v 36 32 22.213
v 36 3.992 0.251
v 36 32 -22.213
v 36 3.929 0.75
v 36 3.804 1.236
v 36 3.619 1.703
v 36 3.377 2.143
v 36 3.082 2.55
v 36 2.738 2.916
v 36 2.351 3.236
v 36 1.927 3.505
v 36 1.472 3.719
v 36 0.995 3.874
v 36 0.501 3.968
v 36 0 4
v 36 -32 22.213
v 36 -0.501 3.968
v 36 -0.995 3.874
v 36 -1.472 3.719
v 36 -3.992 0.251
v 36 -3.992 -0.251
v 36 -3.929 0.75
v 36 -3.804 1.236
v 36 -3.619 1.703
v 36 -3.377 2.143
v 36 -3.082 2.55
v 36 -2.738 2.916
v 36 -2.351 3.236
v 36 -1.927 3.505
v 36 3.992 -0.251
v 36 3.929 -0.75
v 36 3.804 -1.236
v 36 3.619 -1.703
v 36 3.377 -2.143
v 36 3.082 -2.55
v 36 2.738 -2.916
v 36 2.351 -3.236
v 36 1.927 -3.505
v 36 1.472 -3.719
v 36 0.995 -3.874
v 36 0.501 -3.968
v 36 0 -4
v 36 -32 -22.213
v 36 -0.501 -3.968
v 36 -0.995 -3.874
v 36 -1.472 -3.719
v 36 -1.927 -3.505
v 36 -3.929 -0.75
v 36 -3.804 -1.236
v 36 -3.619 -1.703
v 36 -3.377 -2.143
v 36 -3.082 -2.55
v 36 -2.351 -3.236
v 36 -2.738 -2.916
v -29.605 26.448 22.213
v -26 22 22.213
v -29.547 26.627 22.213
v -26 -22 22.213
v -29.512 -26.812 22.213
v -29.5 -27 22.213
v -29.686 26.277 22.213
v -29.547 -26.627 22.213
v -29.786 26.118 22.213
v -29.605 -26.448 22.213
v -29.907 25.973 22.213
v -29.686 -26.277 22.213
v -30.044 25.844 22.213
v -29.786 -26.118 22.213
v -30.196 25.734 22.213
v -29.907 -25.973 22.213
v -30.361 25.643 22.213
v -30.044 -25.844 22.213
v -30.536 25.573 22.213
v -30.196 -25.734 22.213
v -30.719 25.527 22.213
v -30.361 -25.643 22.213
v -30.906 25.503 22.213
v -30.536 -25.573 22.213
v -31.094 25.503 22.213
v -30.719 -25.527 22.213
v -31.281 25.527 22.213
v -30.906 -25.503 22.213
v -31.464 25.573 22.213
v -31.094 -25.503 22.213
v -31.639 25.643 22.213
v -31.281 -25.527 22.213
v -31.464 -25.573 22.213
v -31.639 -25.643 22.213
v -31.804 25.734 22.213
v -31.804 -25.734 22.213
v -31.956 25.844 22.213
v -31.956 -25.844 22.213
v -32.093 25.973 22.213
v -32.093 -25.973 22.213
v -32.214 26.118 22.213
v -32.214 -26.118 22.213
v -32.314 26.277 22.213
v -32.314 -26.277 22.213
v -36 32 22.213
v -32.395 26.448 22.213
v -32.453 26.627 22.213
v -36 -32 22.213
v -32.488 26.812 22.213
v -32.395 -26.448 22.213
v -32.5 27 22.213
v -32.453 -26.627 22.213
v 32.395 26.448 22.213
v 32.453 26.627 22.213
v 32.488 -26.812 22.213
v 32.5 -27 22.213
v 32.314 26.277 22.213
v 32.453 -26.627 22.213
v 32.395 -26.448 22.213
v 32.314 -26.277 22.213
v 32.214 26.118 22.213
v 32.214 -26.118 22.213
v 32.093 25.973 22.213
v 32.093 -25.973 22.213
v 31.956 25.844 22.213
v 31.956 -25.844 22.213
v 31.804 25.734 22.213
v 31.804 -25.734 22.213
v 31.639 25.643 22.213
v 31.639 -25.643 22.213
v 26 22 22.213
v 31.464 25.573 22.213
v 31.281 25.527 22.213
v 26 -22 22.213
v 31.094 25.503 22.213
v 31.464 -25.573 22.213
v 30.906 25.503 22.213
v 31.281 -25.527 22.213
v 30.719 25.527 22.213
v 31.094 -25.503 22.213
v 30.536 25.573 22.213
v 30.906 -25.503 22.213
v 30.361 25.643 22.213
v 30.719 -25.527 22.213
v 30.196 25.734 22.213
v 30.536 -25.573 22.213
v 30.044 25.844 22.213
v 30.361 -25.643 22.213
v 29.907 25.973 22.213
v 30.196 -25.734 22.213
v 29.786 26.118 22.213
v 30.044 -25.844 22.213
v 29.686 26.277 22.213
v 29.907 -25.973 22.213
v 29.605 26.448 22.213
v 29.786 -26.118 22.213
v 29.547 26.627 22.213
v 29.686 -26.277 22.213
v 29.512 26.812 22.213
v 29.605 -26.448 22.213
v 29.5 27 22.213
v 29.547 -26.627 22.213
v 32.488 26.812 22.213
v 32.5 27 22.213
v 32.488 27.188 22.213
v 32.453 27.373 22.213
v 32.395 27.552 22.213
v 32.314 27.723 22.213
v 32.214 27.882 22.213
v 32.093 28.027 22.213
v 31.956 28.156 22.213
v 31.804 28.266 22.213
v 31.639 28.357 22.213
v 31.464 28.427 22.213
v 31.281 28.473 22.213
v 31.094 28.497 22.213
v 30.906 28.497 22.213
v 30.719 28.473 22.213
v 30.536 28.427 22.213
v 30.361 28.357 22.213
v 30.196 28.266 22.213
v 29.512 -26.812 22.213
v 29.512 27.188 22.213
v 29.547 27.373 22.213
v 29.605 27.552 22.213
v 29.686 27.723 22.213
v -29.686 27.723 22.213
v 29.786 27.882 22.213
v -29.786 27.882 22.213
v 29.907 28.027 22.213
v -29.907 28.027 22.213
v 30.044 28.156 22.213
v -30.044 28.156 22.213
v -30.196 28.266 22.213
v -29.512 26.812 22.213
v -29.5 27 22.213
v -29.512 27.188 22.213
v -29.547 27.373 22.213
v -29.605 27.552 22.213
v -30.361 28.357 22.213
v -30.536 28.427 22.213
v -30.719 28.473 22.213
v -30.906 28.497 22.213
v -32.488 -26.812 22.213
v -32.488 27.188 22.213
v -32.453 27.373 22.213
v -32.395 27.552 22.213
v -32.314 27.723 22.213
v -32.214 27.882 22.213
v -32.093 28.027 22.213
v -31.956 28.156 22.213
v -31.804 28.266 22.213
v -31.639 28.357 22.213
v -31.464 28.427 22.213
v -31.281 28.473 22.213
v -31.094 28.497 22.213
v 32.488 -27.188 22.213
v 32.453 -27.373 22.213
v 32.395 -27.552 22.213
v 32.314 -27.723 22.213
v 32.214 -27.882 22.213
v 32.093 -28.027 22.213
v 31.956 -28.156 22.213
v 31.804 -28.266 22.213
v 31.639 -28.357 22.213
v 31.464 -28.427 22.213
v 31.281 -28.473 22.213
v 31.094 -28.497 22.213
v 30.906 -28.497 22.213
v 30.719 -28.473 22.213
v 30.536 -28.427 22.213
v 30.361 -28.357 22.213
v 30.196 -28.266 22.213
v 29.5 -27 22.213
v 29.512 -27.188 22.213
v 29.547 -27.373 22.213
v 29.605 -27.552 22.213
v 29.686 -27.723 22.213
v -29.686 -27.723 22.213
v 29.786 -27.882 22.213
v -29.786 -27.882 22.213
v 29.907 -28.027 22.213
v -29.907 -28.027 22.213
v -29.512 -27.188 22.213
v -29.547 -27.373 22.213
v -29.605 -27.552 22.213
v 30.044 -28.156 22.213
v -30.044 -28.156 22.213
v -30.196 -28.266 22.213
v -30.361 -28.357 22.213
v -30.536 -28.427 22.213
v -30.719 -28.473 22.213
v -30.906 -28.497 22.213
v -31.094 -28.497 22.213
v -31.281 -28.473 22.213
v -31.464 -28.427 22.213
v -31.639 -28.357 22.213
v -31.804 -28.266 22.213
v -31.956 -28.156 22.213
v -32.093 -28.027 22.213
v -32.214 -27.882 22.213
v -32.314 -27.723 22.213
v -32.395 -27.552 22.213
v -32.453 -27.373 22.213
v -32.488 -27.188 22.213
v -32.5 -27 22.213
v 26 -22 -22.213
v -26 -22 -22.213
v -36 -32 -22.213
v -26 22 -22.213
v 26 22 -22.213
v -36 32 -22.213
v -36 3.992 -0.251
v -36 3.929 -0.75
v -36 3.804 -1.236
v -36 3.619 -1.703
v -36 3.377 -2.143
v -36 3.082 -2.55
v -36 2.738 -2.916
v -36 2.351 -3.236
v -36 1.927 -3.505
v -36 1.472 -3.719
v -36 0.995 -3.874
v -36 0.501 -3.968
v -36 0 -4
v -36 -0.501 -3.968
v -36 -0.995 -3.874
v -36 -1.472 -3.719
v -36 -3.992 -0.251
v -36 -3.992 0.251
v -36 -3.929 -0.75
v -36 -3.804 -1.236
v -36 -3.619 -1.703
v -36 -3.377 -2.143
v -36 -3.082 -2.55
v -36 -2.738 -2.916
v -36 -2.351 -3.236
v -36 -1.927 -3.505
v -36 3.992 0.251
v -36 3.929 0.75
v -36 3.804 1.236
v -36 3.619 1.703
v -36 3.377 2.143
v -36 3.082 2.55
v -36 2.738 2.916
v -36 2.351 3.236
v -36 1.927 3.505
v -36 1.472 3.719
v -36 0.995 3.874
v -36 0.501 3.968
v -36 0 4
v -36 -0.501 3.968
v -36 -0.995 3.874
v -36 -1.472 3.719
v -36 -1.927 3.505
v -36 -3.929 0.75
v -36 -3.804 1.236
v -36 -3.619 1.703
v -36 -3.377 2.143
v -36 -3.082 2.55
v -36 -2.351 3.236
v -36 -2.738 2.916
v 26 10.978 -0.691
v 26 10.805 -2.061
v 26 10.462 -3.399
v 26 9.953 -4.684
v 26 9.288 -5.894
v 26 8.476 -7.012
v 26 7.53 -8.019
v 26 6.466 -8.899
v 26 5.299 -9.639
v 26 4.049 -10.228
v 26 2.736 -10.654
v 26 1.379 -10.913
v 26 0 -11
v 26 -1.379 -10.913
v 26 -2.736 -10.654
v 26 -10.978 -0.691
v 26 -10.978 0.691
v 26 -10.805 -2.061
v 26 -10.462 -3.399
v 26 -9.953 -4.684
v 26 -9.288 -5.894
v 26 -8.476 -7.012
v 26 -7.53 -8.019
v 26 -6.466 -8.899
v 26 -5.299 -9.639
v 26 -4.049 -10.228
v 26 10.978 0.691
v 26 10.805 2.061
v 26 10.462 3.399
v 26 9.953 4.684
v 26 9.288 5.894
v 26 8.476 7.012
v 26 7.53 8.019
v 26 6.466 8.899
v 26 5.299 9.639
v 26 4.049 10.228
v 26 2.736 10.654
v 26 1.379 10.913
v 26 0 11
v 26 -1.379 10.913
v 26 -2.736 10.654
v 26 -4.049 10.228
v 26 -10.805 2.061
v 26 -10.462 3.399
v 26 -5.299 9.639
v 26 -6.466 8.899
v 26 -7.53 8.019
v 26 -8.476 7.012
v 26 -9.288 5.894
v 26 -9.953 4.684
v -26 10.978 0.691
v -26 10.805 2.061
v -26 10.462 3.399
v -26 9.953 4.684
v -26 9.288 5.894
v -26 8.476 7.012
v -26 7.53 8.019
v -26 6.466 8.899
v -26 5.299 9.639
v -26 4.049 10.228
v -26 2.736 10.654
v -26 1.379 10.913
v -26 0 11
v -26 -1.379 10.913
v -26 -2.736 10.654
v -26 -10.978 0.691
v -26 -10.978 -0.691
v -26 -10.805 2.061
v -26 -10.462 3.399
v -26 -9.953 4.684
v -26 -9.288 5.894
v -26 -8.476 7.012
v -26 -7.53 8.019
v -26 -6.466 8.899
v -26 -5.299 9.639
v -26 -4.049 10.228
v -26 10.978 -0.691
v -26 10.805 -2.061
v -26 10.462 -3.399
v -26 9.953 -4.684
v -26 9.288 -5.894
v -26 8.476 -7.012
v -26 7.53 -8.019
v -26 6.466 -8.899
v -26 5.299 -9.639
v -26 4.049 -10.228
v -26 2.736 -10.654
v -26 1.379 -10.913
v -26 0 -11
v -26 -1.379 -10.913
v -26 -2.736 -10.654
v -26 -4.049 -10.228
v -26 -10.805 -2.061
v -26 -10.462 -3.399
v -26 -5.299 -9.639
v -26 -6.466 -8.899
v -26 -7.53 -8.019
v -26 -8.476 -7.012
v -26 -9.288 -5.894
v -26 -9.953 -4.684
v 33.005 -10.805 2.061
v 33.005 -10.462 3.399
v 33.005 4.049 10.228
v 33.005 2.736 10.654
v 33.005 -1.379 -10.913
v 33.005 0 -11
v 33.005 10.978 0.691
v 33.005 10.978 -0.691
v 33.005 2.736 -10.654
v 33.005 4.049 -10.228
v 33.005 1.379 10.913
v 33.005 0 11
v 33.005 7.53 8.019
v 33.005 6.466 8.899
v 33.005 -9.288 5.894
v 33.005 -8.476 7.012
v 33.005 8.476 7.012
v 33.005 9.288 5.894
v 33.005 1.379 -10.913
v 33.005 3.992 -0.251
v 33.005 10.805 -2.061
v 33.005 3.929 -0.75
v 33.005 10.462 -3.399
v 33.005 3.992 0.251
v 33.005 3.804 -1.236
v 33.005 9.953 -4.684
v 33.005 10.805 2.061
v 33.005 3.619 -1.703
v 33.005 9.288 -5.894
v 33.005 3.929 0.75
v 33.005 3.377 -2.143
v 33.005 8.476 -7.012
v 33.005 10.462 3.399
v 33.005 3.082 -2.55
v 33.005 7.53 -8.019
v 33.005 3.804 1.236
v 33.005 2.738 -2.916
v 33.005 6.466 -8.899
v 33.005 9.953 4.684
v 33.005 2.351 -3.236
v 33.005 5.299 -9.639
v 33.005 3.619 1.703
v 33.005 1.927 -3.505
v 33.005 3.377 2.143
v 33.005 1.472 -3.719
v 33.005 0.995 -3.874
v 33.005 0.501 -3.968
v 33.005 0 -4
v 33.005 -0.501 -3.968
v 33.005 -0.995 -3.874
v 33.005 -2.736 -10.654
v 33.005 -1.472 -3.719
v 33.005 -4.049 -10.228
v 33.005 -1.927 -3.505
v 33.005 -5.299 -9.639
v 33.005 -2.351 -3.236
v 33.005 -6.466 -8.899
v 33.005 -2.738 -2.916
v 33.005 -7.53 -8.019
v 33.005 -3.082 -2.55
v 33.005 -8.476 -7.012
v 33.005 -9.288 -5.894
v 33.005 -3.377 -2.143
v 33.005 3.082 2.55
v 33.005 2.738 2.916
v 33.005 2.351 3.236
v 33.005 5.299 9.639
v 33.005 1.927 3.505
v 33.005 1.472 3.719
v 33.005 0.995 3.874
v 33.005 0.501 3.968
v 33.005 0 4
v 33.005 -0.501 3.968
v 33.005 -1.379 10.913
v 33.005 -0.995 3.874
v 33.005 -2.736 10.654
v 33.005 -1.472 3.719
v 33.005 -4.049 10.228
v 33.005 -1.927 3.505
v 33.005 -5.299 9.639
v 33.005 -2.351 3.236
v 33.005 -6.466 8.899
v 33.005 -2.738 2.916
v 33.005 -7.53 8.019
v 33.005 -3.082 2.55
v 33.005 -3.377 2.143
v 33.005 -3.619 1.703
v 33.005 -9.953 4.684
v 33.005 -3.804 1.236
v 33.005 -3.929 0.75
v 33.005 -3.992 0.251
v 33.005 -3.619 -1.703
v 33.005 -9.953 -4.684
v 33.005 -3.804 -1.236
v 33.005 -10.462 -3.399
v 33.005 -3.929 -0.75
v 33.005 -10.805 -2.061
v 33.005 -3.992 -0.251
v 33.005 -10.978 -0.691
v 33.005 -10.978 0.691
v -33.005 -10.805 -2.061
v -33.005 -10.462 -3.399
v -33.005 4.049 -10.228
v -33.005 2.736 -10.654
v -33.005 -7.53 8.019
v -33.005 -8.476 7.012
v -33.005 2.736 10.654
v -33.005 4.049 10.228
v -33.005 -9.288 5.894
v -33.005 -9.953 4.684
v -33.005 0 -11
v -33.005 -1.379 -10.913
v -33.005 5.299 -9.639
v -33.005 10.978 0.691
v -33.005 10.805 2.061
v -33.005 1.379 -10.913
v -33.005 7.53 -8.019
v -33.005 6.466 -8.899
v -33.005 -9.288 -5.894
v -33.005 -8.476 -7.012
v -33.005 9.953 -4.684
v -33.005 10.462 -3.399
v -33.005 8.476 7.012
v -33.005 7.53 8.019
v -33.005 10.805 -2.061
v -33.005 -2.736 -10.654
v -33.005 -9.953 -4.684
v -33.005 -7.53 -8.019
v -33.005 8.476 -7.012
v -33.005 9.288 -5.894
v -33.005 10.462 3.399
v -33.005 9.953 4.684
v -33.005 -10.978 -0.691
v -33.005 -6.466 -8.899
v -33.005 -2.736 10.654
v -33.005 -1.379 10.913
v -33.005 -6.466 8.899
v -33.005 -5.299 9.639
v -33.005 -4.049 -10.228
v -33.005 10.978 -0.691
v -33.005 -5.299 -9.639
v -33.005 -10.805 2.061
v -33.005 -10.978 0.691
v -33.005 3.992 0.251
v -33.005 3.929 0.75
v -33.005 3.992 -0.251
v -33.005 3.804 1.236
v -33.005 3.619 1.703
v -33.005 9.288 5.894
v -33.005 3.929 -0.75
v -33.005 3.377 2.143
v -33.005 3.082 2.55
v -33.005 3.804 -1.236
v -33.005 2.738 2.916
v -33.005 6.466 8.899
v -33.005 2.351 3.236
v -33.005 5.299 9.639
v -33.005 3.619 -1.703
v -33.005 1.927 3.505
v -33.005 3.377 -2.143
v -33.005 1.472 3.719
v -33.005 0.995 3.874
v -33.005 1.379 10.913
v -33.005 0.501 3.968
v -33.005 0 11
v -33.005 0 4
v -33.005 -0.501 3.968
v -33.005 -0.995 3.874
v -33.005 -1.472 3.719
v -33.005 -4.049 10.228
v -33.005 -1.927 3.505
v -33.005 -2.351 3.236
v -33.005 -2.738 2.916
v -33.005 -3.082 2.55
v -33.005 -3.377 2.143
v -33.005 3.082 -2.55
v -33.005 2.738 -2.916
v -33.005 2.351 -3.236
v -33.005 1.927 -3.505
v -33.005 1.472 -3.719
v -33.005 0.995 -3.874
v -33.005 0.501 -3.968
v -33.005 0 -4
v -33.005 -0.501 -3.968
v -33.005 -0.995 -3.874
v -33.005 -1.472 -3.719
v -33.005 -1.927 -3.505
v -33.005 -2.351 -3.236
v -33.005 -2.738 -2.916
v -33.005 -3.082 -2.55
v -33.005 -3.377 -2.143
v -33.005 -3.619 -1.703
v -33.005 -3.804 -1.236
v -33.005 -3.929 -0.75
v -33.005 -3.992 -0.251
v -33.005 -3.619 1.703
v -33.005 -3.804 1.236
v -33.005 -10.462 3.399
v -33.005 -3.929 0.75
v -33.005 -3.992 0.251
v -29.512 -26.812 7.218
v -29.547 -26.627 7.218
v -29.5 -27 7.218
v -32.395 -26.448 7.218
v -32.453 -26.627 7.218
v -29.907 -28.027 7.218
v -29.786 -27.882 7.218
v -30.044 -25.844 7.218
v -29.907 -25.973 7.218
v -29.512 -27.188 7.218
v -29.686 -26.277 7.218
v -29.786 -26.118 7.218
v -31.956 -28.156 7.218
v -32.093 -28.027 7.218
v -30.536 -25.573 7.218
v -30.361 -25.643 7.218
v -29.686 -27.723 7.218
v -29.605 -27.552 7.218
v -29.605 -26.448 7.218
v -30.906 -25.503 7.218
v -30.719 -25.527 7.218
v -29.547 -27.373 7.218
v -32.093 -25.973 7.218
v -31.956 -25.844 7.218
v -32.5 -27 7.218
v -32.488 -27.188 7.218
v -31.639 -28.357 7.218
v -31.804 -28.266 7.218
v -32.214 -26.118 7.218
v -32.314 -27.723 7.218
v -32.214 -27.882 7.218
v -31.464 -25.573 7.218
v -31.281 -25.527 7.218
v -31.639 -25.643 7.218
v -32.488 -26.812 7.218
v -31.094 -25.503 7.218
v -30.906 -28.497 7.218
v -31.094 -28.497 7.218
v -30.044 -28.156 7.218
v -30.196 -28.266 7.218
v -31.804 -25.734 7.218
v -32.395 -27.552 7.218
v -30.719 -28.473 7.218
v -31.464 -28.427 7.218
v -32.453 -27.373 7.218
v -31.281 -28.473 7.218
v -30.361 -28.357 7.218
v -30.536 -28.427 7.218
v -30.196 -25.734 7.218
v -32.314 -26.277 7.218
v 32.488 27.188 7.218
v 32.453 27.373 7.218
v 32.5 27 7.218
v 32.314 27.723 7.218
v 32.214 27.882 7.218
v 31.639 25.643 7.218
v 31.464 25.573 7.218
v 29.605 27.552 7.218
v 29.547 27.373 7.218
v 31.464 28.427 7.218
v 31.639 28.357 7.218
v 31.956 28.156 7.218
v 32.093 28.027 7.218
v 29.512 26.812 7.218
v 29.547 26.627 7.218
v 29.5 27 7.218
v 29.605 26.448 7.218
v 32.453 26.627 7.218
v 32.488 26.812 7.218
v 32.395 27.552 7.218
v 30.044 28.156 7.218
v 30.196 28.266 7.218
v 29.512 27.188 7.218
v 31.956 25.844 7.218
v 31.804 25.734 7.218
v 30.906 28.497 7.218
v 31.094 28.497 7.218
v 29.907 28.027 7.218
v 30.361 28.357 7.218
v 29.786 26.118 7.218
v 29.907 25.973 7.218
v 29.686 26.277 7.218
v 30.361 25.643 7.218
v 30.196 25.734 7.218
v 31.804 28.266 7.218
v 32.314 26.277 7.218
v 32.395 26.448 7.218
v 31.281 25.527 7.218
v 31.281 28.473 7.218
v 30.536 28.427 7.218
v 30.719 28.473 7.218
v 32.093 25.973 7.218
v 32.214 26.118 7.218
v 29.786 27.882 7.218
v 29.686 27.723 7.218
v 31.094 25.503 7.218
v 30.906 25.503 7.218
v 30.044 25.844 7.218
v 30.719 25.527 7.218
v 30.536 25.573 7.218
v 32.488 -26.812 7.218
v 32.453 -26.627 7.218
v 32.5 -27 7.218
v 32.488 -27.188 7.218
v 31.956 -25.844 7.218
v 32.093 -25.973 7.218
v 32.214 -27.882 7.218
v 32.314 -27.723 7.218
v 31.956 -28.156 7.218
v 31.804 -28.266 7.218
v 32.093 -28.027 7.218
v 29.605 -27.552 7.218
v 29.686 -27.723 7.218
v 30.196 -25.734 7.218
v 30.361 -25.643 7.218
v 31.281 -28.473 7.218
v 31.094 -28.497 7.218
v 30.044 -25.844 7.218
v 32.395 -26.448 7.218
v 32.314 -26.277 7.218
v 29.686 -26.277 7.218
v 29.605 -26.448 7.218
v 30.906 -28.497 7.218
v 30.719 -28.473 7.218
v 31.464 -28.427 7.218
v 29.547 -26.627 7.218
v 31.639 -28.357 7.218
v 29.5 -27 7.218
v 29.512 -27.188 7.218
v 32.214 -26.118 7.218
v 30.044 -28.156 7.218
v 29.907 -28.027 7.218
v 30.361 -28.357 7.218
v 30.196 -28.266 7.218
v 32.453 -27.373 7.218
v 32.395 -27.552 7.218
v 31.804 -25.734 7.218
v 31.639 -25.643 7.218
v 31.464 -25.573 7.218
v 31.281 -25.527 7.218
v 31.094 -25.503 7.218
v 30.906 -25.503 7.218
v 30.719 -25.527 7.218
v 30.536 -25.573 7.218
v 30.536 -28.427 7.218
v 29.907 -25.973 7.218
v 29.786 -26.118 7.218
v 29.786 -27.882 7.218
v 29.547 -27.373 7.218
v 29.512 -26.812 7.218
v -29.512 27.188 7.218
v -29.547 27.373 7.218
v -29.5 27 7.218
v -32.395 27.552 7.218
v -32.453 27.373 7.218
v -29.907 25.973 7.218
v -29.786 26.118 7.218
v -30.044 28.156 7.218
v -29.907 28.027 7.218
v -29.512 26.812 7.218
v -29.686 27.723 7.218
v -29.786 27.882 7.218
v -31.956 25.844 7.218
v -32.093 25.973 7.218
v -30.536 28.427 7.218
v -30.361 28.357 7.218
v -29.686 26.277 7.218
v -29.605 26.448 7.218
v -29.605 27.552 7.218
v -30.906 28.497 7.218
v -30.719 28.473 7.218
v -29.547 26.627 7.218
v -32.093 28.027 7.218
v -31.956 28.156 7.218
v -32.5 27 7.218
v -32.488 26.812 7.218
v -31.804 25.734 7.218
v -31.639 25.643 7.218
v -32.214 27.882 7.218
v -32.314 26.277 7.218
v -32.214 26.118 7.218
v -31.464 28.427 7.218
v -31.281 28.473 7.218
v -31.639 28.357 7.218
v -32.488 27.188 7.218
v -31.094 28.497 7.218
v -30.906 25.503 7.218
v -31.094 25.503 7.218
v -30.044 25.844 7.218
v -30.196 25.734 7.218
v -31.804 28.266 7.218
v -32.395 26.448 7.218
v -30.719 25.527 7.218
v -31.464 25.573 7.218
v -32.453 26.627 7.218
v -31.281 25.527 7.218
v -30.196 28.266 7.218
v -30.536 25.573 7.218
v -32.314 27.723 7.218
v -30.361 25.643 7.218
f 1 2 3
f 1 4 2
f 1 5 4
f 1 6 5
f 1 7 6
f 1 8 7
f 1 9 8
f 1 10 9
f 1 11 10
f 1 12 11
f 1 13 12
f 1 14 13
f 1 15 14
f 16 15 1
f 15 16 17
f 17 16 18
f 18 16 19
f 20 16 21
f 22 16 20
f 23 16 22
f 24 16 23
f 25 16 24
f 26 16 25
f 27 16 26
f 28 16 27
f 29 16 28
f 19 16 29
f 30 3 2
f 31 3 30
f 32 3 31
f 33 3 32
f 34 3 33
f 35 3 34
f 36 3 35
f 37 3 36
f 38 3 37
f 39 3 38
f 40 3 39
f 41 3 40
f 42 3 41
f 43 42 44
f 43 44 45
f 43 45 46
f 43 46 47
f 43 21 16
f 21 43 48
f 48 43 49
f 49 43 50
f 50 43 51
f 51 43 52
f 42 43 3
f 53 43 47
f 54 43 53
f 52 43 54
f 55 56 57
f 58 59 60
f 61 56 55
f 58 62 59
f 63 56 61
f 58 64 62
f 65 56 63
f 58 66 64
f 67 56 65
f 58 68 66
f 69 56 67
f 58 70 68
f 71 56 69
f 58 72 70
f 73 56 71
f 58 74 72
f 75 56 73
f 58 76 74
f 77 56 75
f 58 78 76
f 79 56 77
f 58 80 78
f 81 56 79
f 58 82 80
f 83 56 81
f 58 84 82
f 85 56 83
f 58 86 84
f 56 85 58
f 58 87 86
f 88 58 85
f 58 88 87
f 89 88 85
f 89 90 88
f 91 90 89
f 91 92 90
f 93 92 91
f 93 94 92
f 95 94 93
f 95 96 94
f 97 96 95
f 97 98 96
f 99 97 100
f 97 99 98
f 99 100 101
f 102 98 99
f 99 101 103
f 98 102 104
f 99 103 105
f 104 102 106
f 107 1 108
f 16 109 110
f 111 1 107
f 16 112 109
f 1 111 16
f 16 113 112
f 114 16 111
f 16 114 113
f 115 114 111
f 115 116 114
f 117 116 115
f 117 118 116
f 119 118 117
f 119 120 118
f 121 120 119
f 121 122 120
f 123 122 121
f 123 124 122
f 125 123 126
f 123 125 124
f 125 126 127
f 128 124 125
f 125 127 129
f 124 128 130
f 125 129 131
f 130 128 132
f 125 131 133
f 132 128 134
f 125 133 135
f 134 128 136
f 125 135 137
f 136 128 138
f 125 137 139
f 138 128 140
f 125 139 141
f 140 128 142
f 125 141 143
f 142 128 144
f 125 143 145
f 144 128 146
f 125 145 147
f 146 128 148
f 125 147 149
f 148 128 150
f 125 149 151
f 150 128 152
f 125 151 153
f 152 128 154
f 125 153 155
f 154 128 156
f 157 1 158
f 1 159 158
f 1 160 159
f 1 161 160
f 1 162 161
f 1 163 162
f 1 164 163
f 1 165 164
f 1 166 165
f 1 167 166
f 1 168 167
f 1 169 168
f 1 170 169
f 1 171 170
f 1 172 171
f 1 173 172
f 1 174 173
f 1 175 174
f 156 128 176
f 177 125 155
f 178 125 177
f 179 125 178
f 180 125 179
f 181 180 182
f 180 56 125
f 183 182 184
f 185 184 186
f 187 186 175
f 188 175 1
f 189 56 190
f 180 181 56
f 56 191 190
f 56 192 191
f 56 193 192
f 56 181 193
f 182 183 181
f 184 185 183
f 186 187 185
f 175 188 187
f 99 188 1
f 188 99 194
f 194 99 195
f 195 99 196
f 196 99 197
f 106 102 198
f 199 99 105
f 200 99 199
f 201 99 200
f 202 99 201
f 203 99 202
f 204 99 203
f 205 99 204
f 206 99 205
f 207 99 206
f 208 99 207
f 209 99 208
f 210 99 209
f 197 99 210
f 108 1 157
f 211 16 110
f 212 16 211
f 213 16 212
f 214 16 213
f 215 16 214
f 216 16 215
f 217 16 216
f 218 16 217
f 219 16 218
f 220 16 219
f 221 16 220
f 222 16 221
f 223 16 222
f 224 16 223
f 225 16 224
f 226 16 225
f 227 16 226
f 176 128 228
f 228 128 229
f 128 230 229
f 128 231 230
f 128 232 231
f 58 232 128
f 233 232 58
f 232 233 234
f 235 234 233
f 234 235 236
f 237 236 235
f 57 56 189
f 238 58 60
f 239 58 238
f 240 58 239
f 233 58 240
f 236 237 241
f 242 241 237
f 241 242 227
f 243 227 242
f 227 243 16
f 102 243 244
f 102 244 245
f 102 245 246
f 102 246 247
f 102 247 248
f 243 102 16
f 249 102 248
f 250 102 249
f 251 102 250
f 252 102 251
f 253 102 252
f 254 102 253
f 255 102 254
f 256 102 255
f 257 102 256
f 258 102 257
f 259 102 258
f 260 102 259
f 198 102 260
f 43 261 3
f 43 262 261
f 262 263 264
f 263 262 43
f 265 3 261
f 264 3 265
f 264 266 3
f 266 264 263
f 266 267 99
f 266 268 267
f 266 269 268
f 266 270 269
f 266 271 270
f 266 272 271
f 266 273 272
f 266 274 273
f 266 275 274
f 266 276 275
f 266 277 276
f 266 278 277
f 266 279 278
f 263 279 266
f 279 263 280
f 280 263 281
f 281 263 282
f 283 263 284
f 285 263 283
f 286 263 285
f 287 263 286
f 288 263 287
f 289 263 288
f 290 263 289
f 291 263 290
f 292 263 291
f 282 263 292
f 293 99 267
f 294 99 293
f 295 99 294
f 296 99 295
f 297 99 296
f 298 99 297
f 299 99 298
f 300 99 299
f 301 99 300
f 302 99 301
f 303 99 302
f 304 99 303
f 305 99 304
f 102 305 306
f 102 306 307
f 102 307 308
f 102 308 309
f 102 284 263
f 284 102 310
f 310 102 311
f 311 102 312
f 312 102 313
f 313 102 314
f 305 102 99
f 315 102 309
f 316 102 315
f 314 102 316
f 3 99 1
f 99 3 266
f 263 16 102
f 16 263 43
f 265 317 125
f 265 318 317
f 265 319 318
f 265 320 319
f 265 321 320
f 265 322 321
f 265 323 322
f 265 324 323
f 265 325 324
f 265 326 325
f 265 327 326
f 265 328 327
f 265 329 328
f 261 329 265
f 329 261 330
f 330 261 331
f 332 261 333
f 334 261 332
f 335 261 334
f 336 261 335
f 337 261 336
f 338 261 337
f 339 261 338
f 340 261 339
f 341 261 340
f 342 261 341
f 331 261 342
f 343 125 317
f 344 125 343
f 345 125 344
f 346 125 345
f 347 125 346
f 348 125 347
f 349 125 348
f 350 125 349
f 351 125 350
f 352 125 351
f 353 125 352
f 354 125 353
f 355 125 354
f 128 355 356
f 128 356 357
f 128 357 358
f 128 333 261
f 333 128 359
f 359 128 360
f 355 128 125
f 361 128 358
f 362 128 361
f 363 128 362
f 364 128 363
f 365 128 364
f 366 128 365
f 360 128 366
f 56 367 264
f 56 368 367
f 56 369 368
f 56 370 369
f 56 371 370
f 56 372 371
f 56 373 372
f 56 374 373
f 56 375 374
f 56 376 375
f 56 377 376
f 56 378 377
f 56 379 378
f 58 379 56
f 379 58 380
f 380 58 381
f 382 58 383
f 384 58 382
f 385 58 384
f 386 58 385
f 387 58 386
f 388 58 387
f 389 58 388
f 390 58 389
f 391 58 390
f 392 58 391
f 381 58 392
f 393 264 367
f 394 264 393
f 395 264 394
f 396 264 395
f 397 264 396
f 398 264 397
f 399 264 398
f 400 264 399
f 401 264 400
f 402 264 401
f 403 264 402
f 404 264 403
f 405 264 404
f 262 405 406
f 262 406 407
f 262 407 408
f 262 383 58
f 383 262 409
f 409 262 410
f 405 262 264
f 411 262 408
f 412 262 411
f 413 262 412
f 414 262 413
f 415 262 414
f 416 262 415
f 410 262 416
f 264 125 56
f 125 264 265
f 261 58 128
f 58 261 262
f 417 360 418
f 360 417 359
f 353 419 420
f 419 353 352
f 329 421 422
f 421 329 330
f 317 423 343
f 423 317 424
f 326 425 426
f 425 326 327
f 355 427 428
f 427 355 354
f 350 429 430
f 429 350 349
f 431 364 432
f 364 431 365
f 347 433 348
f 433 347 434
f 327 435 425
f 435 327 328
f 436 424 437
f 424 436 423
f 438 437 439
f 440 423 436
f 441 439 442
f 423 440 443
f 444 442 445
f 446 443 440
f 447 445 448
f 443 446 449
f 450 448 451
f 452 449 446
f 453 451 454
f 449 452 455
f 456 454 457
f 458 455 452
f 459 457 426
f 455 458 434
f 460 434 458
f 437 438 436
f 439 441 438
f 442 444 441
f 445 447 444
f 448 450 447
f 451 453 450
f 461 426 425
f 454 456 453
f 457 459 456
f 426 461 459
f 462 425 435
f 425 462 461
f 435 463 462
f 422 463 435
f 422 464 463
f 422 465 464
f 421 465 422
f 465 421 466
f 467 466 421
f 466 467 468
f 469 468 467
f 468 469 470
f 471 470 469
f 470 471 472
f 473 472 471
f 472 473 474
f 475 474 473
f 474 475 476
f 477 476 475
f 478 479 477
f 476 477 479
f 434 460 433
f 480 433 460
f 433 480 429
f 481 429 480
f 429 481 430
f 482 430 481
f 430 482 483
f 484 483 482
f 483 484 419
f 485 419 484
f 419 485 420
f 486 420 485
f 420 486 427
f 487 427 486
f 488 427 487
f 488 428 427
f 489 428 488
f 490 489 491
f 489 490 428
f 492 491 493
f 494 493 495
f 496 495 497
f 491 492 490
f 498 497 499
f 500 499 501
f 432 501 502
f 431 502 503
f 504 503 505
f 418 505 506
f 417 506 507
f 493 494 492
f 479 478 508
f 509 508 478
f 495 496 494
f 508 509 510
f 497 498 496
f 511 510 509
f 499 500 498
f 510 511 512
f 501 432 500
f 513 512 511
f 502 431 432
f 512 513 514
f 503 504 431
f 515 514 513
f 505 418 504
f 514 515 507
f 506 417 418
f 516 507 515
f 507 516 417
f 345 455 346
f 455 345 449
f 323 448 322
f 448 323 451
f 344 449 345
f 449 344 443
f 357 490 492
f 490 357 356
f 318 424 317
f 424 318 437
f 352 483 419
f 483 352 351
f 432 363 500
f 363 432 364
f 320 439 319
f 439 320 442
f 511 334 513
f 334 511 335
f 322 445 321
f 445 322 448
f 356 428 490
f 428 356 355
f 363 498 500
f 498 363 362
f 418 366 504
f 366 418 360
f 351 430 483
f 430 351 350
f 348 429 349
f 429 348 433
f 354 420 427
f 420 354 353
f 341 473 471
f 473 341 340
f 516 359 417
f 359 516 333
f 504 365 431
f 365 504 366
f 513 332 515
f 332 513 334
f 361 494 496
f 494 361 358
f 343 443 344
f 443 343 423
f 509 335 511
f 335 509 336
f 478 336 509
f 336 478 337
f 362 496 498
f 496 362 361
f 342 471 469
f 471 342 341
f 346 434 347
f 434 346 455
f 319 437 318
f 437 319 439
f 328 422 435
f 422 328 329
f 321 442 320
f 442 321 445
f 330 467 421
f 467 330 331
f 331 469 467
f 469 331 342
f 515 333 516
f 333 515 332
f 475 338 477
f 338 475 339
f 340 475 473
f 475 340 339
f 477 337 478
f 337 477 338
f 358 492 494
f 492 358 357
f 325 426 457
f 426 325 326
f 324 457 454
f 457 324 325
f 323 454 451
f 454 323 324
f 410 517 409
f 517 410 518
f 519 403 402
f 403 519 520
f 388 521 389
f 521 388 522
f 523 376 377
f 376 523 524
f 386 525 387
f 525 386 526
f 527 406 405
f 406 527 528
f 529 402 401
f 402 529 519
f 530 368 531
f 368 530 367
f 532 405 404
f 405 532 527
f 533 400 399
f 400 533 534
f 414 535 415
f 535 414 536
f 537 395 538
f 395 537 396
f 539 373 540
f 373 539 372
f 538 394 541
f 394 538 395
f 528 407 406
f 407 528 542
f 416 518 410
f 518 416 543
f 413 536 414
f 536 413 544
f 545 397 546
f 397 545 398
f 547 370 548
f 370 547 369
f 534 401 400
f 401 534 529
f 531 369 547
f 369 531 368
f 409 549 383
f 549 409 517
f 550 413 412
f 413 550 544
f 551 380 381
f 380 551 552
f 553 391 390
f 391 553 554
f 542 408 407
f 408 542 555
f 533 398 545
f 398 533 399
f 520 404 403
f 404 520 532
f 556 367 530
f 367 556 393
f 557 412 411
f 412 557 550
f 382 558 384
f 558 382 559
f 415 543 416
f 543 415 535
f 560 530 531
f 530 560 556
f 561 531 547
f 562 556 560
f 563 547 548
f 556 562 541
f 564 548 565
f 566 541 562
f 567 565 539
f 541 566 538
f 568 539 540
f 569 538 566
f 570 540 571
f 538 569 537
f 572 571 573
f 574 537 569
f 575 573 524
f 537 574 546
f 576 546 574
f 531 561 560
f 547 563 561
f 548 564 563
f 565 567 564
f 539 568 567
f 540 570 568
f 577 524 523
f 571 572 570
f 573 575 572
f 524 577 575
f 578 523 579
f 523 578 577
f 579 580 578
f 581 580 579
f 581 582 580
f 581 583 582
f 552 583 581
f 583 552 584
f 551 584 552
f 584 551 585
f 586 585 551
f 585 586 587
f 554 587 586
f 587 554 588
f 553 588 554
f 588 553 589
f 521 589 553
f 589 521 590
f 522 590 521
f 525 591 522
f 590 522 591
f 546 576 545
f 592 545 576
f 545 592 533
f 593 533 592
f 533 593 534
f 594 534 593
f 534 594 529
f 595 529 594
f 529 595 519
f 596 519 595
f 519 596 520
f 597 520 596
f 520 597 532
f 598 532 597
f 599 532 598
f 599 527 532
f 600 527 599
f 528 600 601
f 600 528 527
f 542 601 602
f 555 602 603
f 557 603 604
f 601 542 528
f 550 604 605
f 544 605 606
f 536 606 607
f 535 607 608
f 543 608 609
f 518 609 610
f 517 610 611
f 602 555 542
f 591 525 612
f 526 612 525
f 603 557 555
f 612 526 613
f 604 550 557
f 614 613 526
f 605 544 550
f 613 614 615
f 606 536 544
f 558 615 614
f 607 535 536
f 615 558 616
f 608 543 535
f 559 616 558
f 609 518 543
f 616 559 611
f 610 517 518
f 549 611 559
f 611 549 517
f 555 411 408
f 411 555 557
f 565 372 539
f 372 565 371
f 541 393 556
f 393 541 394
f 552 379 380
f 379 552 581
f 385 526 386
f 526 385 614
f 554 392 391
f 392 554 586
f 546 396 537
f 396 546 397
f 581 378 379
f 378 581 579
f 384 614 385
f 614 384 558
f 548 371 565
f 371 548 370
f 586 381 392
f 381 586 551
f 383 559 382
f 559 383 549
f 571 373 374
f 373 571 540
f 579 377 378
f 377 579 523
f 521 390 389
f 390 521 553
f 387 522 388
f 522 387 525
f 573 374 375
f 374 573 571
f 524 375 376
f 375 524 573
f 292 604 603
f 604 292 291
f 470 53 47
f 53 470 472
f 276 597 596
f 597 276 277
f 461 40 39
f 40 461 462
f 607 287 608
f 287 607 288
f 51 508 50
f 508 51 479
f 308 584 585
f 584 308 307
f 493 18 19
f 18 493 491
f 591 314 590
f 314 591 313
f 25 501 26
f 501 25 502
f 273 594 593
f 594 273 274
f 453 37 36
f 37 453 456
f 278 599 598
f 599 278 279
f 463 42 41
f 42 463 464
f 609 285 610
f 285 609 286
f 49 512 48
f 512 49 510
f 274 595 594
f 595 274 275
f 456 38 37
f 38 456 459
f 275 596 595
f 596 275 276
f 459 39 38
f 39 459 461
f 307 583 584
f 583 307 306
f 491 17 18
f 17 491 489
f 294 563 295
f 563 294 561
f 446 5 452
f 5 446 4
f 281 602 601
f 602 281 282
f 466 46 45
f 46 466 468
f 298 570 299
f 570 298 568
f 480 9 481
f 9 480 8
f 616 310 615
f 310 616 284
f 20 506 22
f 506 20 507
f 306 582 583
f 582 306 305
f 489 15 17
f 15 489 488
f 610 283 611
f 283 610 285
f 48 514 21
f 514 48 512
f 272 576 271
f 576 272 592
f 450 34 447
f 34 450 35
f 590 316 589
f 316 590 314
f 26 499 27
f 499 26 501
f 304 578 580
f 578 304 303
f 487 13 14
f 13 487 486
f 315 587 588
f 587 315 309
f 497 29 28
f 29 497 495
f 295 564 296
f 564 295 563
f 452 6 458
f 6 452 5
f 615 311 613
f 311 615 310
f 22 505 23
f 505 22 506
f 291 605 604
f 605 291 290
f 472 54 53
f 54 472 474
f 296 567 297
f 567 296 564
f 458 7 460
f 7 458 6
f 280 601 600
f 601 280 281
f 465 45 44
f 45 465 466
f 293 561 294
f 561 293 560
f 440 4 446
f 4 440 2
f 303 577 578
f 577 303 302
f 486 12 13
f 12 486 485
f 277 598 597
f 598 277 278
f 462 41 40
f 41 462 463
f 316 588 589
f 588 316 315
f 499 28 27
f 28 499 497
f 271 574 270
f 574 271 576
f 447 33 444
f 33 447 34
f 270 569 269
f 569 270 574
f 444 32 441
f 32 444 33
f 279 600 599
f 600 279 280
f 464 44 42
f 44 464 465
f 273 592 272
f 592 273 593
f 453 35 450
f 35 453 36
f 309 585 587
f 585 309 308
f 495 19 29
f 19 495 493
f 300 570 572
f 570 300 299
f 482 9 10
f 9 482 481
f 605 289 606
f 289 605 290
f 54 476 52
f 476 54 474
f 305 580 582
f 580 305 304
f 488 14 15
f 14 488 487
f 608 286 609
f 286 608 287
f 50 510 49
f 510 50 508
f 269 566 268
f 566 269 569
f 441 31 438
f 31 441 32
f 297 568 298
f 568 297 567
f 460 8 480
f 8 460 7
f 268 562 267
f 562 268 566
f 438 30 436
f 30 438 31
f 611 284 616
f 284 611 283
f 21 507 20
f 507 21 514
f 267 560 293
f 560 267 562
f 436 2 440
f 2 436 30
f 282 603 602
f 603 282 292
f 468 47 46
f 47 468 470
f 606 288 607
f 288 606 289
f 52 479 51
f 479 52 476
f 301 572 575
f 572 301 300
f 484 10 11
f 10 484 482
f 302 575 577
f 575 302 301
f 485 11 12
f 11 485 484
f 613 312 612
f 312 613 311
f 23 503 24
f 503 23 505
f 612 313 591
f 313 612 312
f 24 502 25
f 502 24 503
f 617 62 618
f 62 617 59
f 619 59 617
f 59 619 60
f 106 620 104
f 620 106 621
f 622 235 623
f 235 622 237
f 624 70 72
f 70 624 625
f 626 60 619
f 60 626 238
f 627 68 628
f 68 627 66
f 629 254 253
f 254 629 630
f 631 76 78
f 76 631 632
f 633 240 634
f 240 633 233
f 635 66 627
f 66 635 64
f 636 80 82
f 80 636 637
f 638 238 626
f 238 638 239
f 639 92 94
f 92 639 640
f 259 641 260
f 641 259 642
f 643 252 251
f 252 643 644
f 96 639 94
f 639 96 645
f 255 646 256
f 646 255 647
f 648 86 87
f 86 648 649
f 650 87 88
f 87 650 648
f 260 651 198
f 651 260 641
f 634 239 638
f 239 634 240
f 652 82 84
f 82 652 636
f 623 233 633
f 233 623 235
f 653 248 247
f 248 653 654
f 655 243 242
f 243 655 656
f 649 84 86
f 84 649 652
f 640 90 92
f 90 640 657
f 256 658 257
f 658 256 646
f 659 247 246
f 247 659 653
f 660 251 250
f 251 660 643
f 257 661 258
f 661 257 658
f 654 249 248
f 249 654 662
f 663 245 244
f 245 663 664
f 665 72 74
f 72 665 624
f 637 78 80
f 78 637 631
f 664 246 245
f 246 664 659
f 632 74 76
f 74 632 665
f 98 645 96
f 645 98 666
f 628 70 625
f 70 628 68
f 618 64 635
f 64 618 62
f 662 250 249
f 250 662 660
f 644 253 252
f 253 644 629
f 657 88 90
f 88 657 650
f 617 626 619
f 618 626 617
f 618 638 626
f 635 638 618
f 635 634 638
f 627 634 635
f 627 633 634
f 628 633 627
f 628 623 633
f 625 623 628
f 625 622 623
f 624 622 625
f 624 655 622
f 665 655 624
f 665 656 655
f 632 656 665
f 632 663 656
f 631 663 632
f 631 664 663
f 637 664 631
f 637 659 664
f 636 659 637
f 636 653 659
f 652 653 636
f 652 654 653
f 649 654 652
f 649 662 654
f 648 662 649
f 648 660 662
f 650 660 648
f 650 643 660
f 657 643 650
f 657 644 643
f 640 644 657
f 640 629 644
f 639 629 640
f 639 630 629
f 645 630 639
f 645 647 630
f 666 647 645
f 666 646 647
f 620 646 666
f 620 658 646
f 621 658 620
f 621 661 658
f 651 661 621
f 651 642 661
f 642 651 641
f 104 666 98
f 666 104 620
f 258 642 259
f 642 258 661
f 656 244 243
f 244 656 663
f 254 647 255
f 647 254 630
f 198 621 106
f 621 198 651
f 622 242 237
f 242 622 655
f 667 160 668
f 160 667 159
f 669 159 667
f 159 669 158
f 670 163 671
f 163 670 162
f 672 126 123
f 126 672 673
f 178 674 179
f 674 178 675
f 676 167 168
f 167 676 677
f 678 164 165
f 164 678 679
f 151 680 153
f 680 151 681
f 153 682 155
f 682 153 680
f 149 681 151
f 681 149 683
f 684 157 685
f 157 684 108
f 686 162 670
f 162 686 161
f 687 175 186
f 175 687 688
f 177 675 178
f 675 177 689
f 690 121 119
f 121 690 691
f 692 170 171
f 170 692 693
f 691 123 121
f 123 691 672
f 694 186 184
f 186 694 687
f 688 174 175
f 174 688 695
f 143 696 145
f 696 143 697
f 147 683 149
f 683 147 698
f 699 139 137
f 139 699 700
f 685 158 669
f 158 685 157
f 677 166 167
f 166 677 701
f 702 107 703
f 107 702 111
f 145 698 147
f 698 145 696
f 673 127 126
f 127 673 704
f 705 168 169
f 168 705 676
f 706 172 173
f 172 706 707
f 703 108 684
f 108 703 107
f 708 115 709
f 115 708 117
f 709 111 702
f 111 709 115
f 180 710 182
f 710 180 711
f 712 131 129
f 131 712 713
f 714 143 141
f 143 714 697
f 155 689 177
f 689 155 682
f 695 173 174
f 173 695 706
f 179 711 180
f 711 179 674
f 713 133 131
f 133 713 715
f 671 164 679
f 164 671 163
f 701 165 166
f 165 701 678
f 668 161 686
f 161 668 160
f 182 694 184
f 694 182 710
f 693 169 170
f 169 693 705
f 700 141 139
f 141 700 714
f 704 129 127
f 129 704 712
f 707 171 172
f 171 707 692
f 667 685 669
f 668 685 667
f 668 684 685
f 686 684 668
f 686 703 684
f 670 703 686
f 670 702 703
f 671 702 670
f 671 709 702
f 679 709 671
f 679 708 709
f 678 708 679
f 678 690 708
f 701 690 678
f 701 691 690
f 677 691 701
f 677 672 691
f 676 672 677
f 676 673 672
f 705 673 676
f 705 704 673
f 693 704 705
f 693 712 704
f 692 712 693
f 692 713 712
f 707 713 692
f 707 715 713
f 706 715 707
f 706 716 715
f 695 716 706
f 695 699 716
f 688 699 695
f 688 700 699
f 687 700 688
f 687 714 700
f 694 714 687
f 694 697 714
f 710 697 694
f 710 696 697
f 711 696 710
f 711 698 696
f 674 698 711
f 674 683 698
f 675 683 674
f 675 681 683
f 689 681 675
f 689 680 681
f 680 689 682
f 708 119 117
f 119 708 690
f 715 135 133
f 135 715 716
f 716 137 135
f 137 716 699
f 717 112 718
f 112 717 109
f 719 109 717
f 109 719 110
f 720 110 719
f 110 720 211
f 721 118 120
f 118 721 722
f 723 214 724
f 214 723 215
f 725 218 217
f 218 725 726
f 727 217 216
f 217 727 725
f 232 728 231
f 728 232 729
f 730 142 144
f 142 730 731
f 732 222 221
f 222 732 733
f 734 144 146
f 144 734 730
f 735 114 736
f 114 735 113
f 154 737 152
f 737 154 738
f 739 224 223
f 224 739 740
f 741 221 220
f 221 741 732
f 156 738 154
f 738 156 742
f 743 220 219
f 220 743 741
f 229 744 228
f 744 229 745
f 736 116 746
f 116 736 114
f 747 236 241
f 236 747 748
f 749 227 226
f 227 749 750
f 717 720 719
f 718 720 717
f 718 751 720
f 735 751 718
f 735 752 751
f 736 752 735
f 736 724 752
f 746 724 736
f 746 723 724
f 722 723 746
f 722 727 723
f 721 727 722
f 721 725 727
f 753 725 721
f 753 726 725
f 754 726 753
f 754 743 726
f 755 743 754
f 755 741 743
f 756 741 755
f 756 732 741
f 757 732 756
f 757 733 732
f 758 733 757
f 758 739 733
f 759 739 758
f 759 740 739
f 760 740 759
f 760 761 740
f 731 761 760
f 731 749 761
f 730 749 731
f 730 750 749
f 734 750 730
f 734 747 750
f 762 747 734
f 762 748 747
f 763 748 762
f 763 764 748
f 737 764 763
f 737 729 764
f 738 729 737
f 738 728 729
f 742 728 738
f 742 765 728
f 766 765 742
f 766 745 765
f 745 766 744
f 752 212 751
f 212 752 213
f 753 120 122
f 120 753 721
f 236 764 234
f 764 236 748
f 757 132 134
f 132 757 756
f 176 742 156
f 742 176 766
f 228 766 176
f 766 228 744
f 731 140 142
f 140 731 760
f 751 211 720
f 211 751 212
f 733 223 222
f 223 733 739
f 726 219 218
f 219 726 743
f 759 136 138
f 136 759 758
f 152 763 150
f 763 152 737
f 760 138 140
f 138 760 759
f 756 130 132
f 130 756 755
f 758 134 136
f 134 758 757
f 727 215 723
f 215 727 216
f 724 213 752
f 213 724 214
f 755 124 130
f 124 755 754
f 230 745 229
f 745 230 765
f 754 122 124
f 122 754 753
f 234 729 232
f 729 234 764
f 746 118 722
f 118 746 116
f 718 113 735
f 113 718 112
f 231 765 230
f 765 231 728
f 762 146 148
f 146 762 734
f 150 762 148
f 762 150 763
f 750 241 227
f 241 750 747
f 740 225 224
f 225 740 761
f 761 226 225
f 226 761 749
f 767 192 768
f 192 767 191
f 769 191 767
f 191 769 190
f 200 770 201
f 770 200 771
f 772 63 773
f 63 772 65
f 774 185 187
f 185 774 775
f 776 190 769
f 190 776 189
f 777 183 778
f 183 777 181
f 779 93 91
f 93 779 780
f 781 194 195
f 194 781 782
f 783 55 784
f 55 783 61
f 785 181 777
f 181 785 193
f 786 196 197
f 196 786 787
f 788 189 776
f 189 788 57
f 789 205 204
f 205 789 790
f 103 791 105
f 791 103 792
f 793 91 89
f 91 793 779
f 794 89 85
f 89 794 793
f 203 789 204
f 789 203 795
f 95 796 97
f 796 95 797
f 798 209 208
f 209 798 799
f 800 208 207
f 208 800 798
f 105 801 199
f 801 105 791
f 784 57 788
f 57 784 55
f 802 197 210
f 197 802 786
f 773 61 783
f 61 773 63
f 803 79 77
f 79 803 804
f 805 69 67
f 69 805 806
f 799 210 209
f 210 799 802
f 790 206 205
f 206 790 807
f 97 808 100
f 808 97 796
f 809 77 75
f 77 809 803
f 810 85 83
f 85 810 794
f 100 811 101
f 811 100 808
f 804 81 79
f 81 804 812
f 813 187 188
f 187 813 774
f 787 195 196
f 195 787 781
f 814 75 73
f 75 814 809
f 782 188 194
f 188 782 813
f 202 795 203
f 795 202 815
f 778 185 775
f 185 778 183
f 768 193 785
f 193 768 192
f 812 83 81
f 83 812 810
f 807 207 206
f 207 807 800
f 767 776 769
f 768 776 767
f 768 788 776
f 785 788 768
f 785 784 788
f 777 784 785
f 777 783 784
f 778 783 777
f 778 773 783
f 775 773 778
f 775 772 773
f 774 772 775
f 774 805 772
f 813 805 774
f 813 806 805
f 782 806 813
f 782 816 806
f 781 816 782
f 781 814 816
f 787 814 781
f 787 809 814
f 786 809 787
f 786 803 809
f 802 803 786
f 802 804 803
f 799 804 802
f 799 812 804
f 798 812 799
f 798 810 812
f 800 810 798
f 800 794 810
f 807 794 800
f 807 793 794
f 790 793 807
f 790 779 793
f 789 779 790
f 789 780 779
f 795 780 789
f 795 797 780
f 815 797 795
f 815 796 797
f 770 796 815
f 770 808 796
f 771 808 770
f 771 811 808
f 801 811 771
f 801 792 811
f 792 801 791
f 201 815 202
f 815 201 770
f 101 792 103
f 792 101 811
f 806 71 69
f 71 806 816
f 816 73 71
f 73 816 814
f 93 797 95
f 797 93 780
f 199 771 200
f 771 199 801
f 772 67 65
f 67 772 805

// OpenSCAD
// file: joystick_defines.scad
// Standard skate bearing
bearing_inside_dia = 8;
bearing_outside_dia = 22;
bearing_thickness = 7;

// Arbitrary value
shaft_dia = 16;

zff = 0.005;

// Set this to 1 to translate everything to printable mode
printable_mode = 0;

// Gimbal core block sizes 
gimbal_core_x = 50;
gimbal_core_y = 30;
gimbal_core_z = gimbal_core_y;

// Gimbal frame sizes 
gimbal_frame_thickness = 10; 

circle_faces = 20;

// The 1.8 is 2sin(45)ish, the maximum y on the xy plane the core can occupy
gimbal_frame_x = gimbal_core_x+2*gimbal_frame_thickness+2; // 2mm for washers
gimbal_frame_y = (gimbal_core_y * 1.8)+gimbal_frame_thickness;

// Frame is big enough to stop the core colliding at 45 degree rotation.
gimbal_frame_z = sqrt(pow(gimbal_core_z,2)/2) * 2 + 2; // 2 fudge to allow for clearance at tips.

max_angle = 45; // Not much comes off this, should probably build it in more places.

module bearing()
{
	difference()
	{
		cylinder(h=7+2*zff, r = (bearing_outside_dia/2), $fn=50);

		/*translate([0,0,-zff])
			%cylinder(h=9, r = (bearing_inside_dia/2), $fn=50);*/
	}
}

// Hat sizes
// Note that many other settings for the hats are in their own .scad, only stuff relevant to the rest of the stick is here.
pb_xy = 6;
pb_z = 4; // Height minus pushbutton
pb_btn_z = 1;
pb_total_z = pb_z+pb_btn_z;
pb_btn_dia = 3.5;
pb_leg_x = 4;
pb_leg_y = 5;
pb_leg_z = 0.7;

lever_switch_x = 12.85;
lever_switch_y = 6.5;
lever_switch_z = 5.8;

4_way_hat_base_dia = 18;
4_way_hat_base_base_z = 1; // Base thickness
4_way_hat_base_z = pb_xy + 4_way_hat_base_base_z;
4_way_hat_base_screw_dia = 5;
4_way_hat_base_screw_head_dia = 8.25;
4_way_hat_base_screw_head_thk = 3;
4_way_hat_wire_gap = 2;
4_way_hat_cutout_z = 4_way_hat_base_z + 4_way_hat_base_screw_head_thk;

// Grip sizes
grip_height = 90;
grip_diameter = 40;
grip_clip = 33;
grip_rest_thickness = 6;
grip_rest_diameter = 80;
grip_cms_height = 40;
grip_cms_offset = -5;
grip_cms_angle = 35;
grip_cms_stub_length = 40;
grip_cms_stub_diameter = 4_way_hat_base_dia + 4;

grip_head_offset_x = -10;
grip_head_box_x = 4_way_hat_base_dia * 2.5;
grip_head_box_y = 4_way_hat_base_dia * 2.2;
grip_head_box_z = 4_way_hat_base_dia * 2;

joystick_head_trigger_thickness = pb_xy;

my_layer_thickness = 0.35;

joystick_big_btn_height = 12;
joystick_big_btn_clippyness = 3;

module hat_cutout(bloat)
{
	// Very similar to a hat, but it has a cross on the bottom and a peg to indicate where the cables will be run.
	translate([0,0,-4_way_hat_wire_gap-4_way_hat_base_z])
	union()
	{
		translate([0,0,4_way_hat_wire_gap])cylinder(r=(4_way_hat_base_dia/2)*bloat,h=4_way_hat_base_z);
		
		intersection()
		{
			cylinder(r=(4_way_hat_base_dia/2)*bloat,h=4_way_hat_base_z);
			union()
			{
				cube([100, pb_xy, 10],true);
				cube([pb_xy, 100, 10],true);
			}
		}
		translate([0,0,-4_way_hat_base_screw_head_thk+4_way_hat_wire_gap]) cylinder(r=(4_way_hat_base_screw_head_dia/2),h=4_way_hat_base_screw_head_thk,$fn=circle_faces);
	}
}

module pb(puff, legdir)
{
	translate([0,0,pb_z/2])
	{
		// Puff set to 1 if you want a realistic model of a button.
		// Puff variable used for making holes in things bigger than the button size
		cube([pb_xy*puff,pb_xy*puff,pb_z*puff],center=true);
	
		// Button knob itself
		translate([0,0,pb_z/2-zff])
			cylinder(r=(pb_btn_dia/2),h=pb_btn_z,$fn=circle_faces);
	
		// Button legs
		if (legdir == 0)
		{
			translate([pb_xy/2-pb_leg_x/2,-pb_xy/2-pb_leg_y/2+zff,-pb_z/2+pb_leg_z/2])
				cube([pb_leg_x,pb_leg_y,pb_leg_z],center=true);
			translate([-pb_xy/2+pb_leg_x/2,-pb_xy/2-pb_leg_y/2+zff,-pb_z/2+pb_leg_z/2])
				cube([pb_leg_x,pb_leg_y,pb_leg_z],center=true);
		} else {
			translate([pb_xy/2-pb_leg_x/2,-pb_xy/2+pb_leg_z/2+zff,-pb_z/2-pb_leg_y/2])
				cube([pb_leg_x,pb_leg_z,pb_leg_y],center=true);
			translate([-pb_xy/2+pb_leg_x/2,-pb_xy/2+pb_leg_z/2+zff,-pb_z/2-pb_leg_y/2])
				cube([pb_leg_x,pb_leg_z,pb_leg_y],center=true);
		}
	}

}
// main file
include <joystick_defines.scad>

gimbal_frame();

gimbal_frame_bolt_depth = 15;

module gimbal_frame()
{
	difference()
	{
		cube([gimbal_frame_x,gimbal_frame_y,gimbal_frame_z], center=true);
		// Boosted zff right up here, don't know why it's required, but it is.
		translate([0,0,-zff])
			cube([gimbal_frame_x-(2*gimbal_frame_thickness),gimbal_frame_y-(2*gimbal_frame_thickness),gimbal_frame_z + 30*zff], center=true);

		// X rot bearings 
		translate([gimbal_frame_x/2+zff - (gimbal_frame_thickness-bearing_thickness),0,0])
			rotate([0,-90,0])
				bearing();
		translate([-gimbal_frame_x/2-zff + (gimbal_frame_thickness-bearing_thickness),0,0])
			rotate([0,90,0])
				bearing();

		translate([-(gimbal_frame_x/2)-zff,0,0])
			rotate([0,90,0])
				cylinder(h=(gimbal_frame_x+2*zff), r=(bearing_inside_dia/2), $fn=50);
		// Bolt holes 
		translate([-gimbal_frame_x/2 + gimbal_frame_thickness/2, -gimbal_frame_y/2 + gimbal_frame_thickness/2,gimbal_frame_z/2+zff-gimbal_frame_bolt_depth])
			cylinder(r = 1.5, h=gimbal_frame_bolt_depth + zff, $fn=50);
		translate([gimbal_frame_x/2 - gimbal_frame_thickness/2, gimbal_frame_y/2 - gimbal_frame_thickness/2,gimbal_frame_z/2+zff-gimbal_frame_bolt_depth])
			cylinder(r = 1.5, h=gimbal_frame_bolt_depth + zff, $fn=50);
		translate([gimbal_frame_x/2 - gimbal_frame_thickness/2, -gimbal_frame_y/2 + gimbal_frame_thickness/2,gimbal_frame_z/2+zff-gimbal_frame_bolt_depth])
			cylinder(r = 1.5, h=gimbal_frame_bolt_depth + zff, $fn=50);
		translate([-gimbal_frame_x/2 + gimbal_frame_thickness/2, gimbal_frame_y/2 - gimbal_frame_thickness/2,gimbal_frame_z/2+zff-gimbal_frame_bolt_depth])
			cylinder(r = 1.5, h=gimbal_frame_bolt_depth + zff, $fn=50);

	}
}
